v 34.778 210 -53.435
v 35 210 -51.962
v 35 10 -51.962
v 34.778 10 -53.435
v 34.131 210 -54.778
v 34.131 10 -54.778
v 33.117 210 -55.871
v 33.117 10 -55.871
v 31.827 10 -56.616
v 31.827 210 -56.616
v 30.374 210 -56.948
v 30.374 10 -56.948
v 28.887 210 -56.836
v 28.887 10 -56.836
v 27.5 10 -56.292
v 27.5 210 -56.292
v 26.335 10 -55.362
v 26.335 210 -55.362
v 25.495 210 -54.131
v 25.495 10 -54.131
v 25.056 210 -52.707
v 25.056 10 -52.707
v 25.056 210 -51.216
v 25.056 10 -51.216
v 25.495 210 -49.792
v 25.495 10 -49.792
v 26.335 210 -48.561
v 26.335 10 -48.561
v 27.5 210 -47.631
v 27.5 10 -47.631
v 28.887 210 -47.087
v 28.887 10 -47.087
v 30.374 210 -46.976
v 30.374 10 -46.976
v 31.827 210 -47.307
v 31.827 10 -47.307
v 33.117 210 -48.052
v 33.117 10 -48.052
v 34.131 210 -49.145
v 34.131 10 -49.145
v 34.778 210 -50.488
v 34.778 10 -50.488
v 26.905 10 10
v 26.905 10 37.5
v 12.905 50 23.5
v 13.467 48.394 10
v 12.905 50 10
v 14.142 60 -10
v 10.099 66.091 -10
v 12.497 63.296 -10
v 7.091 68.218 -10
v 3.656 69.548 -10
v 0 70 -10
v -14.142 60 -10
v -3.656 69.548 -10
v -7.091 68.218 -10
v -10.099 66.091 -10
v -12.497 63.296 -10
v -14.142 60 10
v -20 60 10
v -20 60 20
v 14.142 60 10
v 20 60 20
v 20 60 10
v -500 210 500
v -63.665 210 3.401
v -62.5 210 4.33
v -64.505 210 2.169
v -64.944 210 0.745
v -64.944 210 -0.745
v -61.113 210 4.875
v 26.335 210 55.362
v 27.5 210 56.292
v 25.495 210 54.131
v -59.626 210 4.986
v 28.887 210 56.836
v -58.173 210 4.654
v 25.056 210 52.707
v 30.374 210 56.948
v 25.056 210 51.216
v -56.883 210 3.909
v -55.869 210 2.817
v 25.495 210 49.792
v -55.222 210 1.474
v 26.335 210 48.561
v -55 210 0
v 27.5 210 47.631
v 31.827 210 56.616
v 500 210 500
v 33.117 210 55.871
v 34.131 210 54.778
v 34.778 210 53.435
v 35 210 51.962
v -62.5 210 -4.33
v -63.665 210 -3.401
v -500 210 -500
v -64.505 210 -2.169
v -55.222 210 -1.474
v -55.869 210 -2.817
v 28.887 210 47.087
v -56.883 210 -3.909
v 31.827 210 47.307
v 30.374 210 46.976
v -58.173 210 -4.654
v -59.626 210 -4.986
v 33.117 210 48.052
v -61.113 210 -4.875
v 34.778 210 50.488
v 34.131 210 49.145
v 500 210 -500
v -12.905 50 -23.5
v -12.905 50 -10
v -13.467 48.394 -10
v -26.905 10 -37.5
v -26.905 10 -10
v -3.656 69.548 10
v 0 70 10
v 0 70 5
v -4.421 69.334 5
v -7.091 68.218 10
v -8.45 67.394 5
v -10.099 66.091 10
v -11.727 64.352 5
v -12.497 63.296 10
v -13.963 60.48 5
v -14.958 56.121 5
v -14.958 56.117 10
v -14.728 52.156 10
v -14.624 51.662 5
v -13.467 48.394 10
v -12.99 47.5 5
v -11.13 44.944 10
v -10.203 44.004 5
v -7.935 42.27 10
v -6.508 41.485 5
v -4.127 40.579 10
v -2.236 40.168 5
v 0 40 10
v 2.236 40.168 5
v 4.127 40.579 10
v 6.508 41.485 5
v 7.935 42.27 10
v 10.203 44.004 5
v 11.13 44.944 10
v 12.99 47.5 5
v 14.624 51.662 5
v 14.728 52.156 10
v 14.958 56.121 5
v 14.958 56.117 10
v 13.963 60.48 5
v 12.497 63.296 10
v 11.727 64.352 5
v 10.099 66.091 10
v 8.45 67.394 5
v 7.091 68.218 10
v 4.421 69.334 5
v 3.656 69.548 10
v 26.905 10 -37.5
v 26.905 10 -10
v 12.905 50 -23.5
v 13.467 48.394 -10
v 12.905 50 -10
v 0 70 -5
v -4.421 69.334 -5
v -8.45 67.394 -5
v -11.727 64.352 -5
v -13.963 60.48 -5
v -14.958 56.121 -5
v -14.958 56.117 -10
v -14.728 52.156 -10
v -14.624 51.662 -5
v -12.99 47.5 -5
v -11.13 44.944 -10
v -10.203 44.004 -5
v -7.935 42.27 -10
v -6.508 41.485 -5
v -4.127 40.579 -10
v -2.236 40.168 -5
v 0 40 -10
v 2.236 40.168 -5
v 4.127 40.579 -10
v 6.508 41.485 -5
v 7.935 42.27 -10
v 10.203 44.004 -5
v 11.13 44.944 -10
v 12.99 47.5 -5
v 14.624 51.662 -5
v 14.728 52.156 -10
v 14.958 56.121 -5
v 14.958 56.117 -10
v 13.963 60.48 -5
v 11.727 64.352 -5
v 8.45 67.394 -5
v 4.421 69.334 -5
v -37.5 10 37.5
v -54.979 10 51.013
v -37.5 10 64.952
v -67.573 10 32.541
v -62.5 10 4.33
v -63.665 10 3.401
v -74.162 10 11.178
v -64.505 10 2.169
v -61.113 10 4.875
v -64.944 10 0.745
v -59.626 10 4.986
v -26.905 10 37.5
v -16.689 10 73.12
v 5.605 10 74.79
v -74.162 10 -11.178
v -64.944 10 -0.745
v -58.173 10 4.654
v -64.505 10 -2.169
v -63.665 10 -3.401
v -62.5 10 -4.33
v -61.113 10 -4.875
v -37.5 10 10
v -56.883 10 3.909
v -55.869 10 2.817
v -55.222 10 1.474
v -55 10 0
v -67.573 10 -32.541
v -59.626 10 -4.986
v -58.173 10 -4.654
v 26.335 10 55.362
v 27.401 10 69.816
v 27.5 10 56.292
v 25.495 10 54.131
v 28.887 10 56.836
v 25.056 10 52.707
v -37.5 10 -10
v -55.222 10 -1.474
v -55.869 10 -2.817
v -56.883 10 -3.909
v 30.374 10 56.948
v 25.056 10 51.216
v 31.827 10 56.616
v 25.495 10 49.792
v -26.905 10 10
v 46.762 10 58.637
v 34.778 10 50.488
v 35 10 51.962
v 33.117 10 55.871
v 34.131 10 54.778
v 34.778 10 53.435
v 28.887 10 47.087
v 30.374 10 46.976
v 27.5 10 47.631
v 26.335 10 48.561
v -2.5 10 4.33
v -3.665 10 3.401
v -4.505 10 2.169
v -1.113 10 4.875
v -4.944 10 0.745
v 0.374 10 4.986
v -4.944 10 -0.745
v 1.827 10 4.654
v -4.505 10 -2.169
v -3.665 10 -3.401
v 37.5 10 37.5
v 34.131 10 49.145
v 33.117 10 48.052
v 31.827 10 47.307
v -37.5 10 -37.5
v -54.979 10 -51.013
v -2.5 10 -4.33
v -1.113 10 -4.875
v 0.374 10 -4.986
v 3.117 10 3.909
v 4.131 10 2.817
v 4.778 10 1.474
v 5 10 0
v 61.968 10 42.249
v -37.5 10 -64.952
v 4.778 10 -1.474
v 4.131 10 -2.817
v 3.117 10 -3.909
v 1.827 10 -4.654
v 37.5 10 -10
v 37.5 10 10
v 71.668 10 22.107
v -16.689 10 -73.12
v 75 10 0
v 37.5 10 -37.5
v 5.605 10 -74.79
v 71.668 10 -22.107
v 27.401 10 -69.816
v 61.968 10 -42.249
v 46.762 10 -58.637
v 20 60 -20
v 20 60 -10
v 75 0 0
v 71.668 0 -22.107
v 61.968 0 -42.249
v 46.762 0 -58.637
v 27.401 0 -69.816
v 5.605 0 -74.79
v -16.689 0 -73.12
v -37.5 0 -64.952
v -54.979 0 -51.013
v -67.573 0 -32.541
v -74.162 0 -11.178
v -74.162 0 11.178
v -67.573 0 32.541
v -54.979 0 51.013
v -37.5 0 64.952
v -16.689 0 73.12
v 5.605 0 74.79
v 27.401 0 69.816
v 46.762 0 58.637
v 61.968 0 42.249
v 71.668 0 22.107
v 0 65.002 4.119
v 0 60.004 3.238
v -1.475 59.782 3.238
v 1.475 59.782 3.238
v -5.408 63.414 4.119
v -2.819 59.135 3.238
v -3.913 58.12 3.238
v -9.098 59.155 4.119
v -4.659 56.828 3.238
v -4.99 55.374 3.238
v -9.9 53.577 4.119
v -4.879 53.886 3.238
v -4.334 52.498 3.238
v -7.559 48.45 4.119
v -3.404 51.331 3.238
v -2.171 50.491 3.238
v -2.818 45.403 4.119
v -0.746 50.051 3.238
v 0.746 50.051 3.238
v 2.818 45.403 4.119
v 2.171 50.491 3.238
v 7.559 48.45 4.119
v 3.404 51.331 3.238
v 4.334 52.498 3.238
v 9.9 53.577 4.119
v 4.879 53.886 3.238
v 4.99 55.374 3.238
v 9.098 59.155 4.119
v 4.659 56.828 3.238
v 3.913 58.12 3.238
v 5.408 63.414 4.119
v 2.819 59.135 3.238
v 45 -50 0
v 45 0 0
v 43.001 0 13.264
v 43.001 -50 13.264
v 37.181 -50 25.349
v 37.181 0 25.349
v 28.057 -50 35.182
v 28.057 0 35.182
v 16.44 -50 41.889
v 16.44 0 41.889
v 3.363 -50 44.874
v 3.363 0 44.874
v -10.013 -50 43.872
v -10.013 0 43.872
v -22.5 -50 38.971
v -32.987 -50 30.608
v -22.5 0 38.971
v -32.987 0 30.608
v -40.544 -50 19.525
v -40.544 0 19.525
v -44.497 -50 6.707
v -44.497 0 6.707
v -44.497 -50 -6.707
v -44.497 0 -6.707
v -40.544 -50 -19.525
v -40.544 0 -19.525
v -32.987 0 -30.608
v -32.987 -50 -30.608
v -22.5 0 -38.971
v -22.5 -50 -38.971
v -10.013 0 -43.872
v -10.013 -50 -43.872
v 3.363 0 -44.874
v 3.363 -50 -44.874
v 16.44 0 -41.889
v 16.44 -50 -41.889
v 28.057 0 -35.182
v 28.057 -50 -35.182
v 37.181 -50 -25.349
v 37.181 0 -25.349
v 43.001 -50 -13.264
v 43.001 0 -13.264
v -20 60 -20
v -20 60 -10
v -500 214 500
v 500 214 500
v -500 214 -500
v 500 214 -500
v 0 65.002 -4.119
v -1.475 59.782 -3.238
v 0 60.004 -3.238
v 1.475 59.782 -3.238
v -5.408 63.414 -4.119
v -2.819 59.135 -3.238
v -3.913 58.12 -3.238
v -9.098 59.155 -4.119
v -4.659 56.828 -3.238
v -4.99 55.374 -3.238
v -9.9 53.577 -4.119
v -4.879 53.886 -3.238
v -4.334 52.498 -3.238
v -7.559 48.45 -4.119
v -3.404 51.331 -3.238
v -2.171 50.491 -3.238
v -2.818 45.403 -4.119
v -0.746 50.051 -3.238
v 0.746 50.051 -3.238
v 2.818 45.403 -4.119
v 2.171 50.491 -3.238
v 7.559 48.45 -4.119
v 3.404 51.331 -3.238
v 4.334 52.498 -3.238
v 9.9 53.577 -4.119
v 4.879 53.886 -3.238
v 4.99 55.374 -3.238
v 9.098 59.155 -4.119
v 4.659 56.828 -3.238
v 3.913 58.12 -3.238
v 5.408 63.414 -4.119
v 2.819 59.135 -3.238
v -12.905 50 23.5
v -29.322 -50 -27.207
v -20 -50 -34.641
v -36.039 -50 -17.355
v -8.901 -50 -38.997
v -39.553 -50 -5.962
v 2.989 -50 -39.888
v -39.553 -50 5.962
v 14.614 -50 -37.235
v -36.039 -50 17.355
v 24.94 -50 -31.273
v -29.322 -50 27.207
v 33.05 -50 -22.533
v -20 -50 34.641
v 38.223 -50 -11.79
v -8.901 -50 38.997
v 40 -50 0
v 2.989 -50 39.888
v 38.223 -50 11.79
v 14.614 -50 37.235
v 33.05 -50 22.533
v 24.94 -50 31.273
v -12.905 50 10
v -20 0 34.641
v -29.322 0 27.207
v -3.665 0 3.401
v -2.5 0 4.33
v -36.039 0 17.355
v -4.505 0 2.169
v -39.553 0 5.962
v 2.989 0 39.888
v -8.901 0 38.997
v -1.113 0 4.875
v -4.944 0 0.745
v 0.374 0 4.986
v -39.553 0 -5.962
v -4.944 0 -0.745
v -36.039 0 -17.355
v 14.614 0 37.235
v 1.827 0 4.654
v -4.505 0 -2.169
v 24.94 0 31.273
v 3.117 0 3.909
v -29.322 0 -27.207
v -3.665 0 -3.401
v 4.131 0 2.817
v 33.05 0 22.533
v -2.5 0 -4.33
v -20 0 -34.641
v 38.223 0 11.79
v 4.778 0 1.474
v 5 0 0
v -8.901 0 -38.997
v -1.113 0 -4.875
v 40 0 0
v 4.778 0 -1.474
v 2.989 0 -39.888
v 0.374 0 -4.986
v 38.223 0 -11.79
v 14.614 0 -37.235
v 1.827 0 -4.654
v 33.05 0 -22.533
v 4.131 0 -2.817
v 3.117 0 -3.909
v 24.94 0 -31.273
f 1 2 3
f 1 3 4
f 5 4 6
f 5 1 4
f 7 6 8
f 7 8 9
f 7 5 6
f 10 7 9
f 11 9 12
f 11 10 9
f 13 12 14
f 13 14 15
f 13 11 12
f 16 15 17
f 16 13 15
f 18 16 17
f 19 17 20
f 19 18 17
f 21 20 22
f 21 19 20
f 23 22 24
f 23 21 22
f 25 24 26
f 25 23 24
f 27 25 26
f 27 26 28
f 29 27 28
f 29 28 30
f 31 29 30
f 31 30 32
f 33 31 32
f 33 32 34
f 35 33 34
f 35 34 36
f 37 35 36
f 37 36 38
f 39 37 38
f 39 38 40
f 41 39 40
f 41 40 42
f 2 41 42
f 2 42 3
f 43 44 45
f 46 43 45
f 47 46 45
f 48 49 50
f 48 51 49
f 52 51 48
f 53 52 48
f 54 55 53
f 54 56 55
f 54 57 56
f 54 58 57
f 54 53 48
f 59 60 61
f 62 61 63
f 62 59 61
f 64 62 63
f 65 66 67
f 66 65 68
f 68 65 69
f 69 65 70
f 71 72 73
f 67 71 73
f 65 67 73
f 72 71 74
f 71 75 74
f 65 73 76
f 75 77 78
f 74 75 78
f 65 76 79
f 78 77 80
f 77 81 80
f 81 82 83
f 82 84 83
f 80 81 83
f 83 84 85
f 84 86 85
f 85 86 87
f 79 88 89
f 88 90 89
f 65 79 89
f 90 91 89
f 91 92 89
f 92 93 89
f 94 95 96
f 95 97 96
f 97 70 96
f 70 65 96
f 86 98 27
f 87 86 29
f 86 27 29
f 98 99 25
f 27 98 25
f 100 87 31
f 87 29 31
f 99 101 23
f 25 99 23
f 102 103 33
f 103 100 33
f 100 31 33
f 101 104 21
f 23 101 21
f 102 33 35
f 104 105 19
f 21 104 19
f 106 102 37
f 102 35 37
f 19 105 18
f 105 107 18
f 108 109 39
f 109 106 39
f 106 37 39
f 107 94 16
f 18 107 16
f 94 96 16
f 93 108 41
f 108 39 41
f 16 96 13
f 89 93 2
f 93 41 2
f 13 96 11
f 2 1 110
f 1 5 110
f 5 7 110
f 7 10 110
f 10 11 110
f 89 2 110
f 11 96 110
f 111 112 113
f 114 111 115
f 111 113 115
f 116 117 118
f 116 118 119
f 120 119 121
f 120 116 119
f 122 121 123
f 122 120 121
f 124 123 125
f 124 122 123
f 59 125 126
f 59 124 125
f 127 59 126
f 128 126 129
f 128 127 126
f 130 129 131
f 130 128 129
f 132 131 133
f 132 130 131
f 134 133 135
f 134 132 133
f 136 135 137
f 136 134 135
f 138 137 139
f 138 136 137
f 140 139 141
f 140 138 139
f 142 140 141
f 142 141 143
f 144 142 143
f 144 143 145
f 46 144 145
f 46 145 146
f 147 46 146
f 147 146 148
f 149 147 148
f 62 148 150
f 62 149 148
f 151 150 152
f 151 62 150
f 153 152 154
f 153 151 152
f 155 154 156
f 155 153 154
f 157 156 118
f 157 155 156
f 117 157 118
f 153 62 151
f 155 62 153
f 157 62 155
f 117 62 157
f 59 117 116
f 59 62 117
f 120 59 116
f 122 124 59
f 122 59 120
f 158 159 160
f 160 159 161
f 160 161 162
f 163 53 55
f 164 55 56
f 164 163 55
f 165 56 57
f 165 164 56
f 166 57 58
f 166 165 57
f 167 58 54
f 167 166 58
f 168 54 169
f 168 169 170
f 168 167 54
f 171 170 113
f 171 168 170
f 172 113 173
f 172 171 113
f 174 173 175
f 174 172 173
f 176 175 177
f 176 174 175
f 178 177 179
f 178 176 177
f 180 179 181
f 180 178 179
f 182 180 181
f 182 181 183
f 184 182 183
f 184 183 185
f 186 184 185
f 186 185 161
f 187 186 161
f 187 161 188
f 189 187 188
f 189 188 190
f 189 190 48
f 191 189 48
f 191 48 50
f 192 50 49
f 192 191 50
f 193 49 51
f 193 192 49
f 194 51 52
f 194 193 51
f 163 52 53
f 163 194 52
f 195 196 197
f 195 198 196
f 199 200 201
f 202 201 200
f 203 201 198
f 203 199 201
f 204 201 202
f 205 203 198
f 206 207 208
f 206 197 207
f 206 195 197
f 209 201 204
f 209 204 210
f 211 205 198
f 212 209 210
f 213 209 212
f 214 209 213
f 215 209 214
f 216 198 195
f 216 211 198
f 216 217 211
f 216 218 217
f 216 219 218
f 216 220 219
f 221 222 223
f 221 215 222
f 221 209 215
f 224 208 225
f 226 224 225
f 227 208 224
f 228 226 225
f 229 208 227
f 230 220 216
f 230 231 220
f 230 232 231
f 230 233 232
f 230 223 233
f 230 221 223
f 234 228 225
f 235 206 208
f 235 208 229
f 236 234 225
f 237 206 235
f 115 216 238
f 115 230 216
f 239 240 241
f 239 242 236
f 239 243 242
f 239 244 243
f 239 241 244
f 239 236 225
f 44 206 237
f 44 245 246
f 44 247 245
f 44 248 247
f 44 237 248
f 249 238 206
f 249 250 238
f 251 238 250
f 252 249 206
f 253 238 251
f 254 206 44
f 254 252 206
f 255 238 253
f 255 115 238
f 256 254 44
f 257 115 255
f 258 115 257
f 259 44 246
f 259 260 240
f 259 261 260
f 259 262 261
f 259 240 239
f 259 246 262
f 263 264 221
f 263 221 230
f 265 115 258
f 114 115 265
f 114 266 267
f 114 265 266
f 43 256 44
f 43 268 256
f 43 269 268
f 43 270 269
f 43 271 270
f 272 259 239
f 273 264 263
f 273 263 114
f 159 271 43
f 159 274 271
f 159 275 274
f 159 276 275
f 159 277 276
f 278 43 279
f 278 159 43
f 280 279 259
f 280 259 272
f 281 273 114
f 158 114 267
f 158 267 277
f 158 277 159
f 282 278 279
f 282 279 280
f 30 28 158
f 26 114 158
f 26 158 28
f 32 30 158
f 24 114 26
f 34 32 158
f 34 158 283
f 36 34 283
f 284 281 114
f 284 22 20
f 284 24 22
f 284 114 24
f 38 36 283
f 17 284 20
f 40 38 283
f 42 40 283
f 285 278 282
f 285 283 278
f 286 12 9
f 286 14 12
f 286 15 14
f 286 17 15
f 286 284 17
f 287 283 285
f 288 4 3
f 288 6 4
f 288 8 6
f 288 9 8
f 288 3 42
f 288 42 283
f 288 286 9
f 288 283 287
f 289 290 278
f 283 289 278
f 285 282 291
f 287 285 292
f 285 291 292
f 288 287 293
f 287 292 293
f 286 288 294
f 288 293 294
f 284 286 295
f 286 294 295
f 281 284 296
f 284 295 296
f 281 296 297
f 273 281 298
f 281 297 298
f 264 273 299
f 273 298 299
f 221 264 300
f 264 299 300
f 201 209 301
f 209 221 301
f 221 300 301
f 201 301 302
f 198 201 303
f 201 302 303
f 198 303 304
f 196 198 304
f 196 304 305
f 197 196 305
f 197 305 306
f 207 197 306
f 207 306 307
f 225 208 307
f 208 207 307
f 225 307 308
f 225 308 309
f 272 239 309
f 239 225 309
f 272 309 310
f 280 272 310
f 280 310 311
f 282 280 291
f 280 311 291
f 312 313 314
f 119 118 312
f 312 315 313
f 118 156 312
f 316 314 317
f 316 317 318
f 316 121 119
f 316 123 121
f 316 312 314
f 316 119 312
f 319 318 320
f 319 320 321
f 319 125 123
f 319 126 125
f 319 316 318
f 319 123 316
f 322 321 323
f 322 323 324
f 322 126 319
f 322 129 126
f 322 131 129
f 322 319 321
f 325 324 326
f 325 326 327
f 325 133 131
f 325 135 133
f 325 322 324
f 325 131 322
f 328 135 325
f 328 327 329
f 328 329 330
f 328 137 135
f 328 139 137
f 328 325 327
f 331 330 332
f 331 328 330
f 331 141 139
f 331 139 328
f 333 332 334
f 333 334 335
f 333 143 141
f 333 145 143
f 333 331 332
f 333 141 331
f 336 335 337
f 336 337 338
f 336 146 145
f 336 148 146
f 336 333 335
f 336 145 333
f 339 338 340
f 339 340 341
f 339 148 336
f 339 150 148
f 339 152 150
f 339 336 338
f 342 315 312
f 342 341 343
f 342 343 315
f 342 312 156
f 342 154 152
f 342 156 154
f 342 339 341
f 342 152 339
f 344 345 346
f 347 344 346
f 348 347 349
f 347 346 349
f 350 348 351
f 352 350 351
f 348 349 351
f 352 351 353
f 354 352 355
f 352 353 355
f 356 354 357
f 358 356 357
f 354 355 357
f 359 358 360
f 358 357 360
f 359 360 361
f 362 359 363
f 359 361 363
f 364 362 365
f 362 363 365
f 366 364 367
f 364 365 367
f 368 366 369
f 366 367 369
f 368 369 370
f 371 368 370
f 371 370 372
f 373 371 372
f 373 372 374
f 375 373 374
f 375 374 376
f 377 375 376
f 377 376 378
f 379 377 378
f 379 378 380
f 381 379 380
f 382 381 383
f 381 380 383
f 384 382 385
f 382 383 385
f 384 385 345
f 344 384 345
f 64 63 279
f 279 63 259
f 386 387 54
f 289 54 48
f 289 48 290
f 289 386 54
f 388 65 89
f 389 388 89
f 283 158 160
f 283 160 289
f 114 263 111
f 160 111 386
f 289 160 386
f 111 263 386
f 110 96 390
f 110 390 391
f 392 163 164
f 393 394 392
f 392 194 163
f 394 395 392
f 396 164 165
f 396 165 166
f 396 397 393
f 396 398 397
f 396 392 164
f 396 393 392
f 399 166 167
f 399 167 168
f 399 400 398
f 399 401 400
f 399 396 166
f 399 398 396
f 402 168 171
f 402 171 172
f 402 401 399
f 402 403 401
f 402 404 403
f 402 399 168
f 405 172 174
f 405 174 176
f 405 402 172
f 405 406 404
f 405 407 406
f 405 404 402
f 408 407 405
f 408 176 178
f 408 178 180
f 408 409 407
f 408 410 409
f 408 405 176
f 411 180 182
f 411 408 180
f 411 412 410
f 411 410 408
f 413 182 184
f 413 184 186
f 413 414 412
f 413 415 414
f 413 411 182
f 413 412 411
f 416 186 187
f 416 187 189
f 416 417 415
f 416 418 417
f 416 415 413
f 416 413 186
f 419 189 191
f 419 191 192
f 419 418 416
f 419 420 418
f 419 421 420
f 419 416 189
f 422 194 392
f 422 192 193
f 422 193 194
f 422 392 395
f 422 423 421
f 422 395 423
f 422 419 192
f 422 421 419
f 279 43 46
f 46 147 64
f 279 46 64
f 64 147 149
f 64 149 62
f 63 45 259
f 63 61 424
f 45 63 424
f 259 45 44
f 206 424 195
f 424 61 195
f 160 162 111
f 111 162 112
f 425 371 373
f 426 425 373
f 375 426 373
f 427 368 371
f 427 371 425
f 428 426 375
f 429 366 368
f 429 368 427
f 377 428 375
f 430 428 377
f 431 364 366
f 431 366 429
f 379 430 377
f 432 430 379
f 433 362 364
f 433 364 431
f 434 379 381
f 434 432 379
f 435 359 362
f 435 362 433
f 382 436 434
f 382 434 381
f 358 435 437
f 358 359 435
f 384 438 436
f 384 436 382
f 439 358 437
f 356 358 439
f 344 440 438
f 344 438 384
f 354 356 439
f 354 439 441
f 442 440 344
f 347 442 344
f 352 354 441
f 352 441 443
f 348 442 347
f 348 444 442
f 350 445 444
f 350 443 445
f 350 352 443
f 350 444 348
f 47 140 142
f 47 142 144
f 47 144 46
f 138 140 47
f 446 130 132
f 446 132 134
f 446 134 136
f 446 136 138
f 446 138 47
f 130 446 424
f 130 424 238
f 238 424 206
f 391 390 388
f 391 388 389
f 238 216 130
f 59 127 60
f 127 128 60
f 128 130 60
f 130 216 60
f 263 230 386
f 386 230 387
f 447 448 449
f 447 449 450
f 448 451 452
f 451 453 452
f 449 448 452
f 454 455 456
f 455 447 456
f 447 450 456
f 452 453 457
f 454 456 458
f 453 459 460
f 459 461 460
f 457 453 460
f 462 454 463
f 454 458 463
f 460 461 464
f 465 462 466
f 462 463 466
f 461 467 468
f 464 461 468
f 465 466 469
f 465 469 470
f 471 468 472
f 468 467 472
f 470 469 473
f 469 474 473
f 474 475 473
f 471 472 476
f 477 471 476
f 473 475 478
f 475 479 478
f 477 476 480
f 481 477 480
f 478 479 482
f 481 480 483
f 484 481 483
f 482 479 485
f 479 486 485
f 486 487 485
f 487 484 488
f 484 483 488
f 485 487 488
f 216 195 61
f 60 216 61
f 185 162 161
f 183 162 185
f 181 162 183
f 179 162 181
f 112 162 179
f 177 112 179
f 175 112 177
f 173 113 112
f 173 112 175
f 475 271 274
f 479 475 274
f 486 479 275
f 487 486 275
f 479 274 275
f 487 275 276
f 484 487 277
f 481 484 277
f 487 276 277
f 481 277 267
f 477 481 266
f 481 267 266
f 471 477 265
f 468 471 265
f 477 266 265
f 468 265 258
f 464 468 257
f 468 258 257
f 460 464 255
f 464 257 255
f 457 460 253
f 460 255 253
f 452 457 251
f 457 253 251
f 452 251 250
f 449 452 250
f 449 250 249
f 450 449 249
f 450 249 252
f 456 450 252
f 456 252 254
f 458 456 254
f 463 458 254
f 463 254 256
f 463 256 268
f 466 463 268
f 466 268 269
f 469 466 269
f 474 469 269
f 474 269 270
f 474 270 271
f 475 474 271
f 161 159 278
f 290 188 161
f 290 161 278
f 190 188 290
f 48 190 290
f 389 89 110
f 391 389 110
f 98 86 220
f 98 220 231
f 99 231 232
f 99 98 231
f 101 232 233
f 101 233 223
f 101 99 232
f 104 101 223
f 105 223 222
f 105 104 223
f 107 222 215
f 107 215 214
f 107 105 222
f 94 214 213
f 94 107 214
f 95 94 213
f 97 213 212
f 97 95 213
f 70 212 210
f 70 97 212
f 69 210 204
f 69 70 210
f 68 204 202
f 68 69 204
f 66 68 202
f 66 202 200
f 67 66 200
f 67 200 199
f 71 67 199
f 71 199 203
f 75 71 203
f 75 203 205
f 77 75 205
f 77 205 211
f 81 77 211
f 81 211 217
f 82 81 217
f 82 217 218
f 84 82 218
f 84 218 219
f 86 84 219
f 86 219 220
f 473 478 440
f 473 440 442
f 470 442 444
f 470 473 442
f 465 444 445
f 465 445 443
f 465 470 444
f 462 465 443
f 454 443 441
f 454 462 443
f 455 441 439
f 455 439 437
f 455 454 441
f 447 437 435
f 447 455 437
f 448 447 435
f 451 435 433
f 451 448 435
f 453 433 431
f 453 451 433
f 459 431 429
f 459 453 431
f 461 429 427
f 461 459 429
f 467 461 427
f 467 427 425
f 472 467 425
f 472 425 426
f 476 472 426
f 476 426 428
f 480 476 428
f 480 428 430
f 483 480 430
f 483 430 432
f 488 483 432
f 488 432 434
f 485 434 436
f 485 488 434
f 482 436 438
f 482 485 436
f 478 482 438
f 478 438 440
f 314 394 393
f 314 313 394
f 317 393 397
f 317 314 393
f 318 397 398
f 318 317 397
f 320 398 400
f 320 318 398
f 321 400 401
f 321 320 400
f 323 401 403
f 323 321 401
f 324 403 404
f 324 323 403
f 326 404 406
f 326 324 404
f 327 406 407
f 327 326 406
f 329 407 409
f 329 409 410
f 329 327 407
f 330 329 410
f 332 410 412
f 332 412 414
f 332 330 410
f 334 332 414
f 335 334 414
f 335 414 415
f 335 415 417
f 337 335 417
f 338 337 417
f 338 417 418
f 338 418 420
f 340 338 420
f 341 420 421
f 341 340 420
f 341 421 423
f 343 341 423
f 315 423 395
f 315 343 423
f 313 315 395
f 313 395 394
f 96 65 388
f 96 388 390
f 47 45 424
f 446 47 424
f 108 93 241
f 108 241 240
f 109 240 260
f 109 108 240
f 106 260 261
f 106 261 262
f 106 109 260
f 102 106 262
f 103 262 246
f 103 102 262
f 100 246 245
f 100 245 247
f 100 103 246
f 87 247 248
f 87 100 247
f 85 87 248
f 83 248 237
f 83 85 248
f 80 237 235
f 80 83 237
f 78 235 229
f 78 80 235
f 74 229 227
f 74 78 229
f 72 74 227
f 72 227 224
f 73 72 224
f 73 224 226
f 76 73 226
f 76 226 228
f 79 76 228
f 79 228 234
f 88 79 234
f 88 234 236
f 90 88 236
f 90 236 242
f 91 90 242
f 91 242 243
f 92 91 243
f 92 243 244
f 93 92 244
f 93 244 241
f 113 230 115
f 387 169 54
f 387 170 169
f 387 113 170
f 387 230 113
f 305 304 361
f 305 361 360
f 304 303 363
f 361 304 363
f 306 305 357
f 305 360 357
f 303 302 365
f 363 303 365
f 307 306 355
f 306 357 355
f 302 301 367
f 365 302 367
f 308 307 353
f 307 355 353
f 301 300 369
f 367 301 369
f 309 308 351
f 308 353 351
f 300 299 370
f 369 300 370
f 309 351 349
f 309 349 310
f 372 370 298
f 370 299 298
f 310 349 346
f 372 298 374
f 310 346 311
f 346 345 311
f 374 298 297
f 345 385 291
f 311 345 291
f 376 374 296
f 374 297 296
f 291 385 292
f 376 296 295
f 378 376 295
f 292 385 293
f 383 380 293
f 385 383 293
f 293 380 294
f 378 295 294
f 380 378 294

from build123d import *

# Parameters (mm, degrees)
SKETCH1_R               = 75
BOSS_EXTRUDE1_DEPTH     = 10
SKETCH2_R               = 45
SKETCH2_R_2             = 40
BOSS_EXTRUDE2_DEPTH     = 50
SKETCH5_W               = 75
SKETCH5_H               = 75
BOSS_EXTRUDE3_DEPTH     = 50
CUT_EXTRUDE2_DEPTH      = 103
CUT_EXTRUDE3_DEPTH      = 103
CUT_EXTRUDE3_DEPTH_BACK = 103
CUT_EXTRUDE4_DEPTH      = 103
CUT_EXTRUDE4_DEPTH_BACK = 103
SKETCH9_W               = 20
SKETCH9_H               = 50
SKETCH10_R              = 5
CUT_EXTRUDE5_DEPTH      = 103
SKETCH11_R              = 5
SKETCH13_W              = 1000
SKETCH13_H              = 1000
BOSS_EXTRUDE4_DEPTH     = 4


with BuildPart() as part:
    # Sketch1 → Boss-Extrude1 (new body)
    with BuildSketch(Plane(origin=(0, 0, 0), x_dir=(1, 0, 0), z_dir=(0, 1, 0))):
        Circle(SKETCH1_R)
    extrude(amount=BOSS_EXTRUDE1_DEPTH)

    # Sketch2 → Boss-Extrude2 (add)
    with BuildSketch(Plane.XZ):
        Circle(SKETCH2_R)
        Circle(SKETCH2_R_2, mode=Mode.SUBTRACT)
    extrude(amount=BOSS_EXTRUDE2_DEPTH)

    # Sketch5 → Boss-Extrude3 (add)
    with BuildSketch(Plane(origin=(0, 10, 0), x_dir=(1, 0, 0), z_dir=(0, 1, 0))):
        Rectangle(SKETCH5_W, SKETCH5_H)
    extrude(amount=BOSS_EXTRUDE3_DEPTH)

    # Sketch6 → Cut-Extrude2 (cut)
    with BuildSketch(Plane.XY.offset(37.5)):
        Polygon((20, 60), (37.5, 10), (43.069722315, 10), (43.069722315, 63.034625831), (-42.678571429, 63.034625831), (-42.678571429, 10), (-37.5, 10), (-20, 60), align=None)
        Polygon((-12.90518995, 50), (-26.90518995, 10), (26.90518995, 10), (12.90518995, 50), align=None)
    extrude(amount=-CUT_EXTRUDE2_DEPTH, mode=Mode.SUBTRACT)

    # Sketch7 → Cut-Extrude3 (cut, two sides: drawn at the far end of the back side and taken through both)
    with BuildSketch(Plane(origin=(0, 0, 0), x_dir=(0, 0, -1), z_dir=(1, 0, 0)).offset(-CUT_EXTRUDE3_DEPTH_BACK)):
        Polygon((20, 60), (-20, 60), (-37.5, 10), (-47.69302584, 10), (-47.69302584, 63.764621125), (47.449694076, 63.764621125), (47.449694076, 10), (37.5, 10), align=None)
    extrude(amount=CUT_EXTRUDE3_DEPTH + CUT_EXTRUDE3_DEPTH_BACK, mode=Mode.SUBTRACT)

    # Sketch9 → Cut-Extrude4 (cut, two sides: drawn at the far end of the back side and taken through both)
    with BuildSketch(Plane(origin=(0, 0, 0), x_dir=(0, 0, -1), z_dir=(1, 0, 0)).offset(-CUT_EXTRUDE4_DEPTH_BACK)):
        with Locations((0, 35)):
            Rectangle(SKETCH9_W, SKETCH9_H)
    extrude(amount=CUT_EXTRUDE4_DEPTH + CUT_EXTRUDE4_DEPTH_BACK, mode=Mode.SUBTRACT)

    # Sketch10 → Cut-Extrude5 (cut)
    with BuildSketch(Plane(origin=(0, 10, 0), x_dir=(1, 0, 0), z_dir=(0, 1, 0))):
        Circle(SKETCH10_R)
    extrude(amount=-CUT_EXTRUDE5_DEPTH, mode=Mode.SUBTRACT)

    # Sweep1: sweep along a curve in space
    with BuildLine() as sweep1_path:
        Line((-60, 10, 0), (-60, 210, 0))
    # Sketch11 → Sweep1 (sweep)
    with BuildSketch(Plane(origin=(0, 10, 0), x_dir=(1, 0, 0), z_dir=(0, 1, 0))):
        with Locations((-60, 0)):
            Circle(SKETCH11_R)
        with Locations((30, 51.961524227)):
            Circle(SKETCH11_R)
        with Locations((30, -51.961524227)):
            Circle(SKETCH11_R)
    sweep(path=sweep1_path.line)

    # Sketch13 → Boss-Extrude4 (add)
    with BuildSketch(Plane(origin=(0, 210, 0), x_dir=(1, 0, 0), z_dir=(0, 1, 0))):
        Rectangle(SKETCH13_W, SKETCH13_H)
    extrude(amount=BOSS_EXTRUDE4_DEPTH)

    # Sketch17 → Revolve2 (revolve)
    with BuildSketch(Plane(origin=(0, 0, 0), x_dir=(0, 0, -1), z_dir=(1, 0, 0))):
        Polygon((10, 55), (10, 70), (5, 70), (3.237517532, 60.004465223), (-3.237517532, 60.004465223), (-5, 70), (-10, 70), (-10, 55), align=None)
    revolve(axis=Axis((0, 55, -10), (0, 0, 1)))


solid = part.part
